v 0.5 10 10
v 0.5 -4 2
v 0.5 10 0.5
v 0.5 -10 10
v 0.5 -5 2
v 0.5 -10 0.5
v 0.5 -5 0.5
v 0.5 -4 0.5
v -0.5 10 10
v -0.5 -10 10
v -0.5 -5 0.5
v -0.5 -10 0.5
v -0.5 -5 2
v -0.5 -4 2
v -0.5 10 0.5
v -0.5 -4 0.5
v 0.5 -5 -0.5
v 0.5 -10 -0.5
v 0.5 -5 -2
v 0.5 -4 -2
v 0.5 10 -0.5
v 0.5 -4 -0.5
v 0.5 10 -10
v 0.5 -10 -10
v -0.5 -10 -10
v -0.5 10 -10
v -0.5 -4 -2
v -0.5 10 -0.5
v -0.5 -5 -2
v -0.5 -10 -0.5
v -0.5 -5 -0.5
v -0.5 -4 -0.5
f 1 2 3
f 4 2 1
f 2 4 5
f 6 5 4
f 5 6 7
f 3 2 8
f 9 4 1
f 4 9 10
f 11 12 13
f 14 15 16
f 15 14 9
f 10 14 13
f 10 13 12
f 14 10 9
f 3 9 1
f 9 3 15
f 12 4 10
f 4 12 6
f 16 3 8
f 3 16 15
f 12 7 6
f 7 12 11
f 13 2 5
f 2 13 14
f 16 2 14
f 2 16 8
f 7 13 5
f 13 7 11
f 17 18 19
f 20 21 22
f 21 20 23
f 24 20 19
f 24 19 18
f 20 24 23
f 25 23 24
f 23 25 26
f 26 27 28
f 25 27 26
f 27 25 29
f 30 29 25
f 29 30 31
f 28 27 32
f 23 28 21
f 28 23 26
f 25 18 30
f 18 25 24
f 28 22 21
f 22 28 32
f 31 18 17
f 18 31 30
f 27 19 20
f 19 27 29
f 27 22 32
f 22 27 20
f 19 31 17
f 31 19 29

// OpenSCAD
difference(){
	translate([-0.5,-10,0]) cube([1,20,10]);
	translate([-0.5,-10,-0.5]) cube([1,20,1]);
	translate([-0.5,-5,-2]) cube([1,1,4]);

}
difference(){
	translate([-0.5,-10,-10]) cube([1,20,10]);
	translate([-0.5,-10,-0.5]) cube([1,20,1]);
	translate([-0.5,-5,-2]) cube([1,1,4]);
}
